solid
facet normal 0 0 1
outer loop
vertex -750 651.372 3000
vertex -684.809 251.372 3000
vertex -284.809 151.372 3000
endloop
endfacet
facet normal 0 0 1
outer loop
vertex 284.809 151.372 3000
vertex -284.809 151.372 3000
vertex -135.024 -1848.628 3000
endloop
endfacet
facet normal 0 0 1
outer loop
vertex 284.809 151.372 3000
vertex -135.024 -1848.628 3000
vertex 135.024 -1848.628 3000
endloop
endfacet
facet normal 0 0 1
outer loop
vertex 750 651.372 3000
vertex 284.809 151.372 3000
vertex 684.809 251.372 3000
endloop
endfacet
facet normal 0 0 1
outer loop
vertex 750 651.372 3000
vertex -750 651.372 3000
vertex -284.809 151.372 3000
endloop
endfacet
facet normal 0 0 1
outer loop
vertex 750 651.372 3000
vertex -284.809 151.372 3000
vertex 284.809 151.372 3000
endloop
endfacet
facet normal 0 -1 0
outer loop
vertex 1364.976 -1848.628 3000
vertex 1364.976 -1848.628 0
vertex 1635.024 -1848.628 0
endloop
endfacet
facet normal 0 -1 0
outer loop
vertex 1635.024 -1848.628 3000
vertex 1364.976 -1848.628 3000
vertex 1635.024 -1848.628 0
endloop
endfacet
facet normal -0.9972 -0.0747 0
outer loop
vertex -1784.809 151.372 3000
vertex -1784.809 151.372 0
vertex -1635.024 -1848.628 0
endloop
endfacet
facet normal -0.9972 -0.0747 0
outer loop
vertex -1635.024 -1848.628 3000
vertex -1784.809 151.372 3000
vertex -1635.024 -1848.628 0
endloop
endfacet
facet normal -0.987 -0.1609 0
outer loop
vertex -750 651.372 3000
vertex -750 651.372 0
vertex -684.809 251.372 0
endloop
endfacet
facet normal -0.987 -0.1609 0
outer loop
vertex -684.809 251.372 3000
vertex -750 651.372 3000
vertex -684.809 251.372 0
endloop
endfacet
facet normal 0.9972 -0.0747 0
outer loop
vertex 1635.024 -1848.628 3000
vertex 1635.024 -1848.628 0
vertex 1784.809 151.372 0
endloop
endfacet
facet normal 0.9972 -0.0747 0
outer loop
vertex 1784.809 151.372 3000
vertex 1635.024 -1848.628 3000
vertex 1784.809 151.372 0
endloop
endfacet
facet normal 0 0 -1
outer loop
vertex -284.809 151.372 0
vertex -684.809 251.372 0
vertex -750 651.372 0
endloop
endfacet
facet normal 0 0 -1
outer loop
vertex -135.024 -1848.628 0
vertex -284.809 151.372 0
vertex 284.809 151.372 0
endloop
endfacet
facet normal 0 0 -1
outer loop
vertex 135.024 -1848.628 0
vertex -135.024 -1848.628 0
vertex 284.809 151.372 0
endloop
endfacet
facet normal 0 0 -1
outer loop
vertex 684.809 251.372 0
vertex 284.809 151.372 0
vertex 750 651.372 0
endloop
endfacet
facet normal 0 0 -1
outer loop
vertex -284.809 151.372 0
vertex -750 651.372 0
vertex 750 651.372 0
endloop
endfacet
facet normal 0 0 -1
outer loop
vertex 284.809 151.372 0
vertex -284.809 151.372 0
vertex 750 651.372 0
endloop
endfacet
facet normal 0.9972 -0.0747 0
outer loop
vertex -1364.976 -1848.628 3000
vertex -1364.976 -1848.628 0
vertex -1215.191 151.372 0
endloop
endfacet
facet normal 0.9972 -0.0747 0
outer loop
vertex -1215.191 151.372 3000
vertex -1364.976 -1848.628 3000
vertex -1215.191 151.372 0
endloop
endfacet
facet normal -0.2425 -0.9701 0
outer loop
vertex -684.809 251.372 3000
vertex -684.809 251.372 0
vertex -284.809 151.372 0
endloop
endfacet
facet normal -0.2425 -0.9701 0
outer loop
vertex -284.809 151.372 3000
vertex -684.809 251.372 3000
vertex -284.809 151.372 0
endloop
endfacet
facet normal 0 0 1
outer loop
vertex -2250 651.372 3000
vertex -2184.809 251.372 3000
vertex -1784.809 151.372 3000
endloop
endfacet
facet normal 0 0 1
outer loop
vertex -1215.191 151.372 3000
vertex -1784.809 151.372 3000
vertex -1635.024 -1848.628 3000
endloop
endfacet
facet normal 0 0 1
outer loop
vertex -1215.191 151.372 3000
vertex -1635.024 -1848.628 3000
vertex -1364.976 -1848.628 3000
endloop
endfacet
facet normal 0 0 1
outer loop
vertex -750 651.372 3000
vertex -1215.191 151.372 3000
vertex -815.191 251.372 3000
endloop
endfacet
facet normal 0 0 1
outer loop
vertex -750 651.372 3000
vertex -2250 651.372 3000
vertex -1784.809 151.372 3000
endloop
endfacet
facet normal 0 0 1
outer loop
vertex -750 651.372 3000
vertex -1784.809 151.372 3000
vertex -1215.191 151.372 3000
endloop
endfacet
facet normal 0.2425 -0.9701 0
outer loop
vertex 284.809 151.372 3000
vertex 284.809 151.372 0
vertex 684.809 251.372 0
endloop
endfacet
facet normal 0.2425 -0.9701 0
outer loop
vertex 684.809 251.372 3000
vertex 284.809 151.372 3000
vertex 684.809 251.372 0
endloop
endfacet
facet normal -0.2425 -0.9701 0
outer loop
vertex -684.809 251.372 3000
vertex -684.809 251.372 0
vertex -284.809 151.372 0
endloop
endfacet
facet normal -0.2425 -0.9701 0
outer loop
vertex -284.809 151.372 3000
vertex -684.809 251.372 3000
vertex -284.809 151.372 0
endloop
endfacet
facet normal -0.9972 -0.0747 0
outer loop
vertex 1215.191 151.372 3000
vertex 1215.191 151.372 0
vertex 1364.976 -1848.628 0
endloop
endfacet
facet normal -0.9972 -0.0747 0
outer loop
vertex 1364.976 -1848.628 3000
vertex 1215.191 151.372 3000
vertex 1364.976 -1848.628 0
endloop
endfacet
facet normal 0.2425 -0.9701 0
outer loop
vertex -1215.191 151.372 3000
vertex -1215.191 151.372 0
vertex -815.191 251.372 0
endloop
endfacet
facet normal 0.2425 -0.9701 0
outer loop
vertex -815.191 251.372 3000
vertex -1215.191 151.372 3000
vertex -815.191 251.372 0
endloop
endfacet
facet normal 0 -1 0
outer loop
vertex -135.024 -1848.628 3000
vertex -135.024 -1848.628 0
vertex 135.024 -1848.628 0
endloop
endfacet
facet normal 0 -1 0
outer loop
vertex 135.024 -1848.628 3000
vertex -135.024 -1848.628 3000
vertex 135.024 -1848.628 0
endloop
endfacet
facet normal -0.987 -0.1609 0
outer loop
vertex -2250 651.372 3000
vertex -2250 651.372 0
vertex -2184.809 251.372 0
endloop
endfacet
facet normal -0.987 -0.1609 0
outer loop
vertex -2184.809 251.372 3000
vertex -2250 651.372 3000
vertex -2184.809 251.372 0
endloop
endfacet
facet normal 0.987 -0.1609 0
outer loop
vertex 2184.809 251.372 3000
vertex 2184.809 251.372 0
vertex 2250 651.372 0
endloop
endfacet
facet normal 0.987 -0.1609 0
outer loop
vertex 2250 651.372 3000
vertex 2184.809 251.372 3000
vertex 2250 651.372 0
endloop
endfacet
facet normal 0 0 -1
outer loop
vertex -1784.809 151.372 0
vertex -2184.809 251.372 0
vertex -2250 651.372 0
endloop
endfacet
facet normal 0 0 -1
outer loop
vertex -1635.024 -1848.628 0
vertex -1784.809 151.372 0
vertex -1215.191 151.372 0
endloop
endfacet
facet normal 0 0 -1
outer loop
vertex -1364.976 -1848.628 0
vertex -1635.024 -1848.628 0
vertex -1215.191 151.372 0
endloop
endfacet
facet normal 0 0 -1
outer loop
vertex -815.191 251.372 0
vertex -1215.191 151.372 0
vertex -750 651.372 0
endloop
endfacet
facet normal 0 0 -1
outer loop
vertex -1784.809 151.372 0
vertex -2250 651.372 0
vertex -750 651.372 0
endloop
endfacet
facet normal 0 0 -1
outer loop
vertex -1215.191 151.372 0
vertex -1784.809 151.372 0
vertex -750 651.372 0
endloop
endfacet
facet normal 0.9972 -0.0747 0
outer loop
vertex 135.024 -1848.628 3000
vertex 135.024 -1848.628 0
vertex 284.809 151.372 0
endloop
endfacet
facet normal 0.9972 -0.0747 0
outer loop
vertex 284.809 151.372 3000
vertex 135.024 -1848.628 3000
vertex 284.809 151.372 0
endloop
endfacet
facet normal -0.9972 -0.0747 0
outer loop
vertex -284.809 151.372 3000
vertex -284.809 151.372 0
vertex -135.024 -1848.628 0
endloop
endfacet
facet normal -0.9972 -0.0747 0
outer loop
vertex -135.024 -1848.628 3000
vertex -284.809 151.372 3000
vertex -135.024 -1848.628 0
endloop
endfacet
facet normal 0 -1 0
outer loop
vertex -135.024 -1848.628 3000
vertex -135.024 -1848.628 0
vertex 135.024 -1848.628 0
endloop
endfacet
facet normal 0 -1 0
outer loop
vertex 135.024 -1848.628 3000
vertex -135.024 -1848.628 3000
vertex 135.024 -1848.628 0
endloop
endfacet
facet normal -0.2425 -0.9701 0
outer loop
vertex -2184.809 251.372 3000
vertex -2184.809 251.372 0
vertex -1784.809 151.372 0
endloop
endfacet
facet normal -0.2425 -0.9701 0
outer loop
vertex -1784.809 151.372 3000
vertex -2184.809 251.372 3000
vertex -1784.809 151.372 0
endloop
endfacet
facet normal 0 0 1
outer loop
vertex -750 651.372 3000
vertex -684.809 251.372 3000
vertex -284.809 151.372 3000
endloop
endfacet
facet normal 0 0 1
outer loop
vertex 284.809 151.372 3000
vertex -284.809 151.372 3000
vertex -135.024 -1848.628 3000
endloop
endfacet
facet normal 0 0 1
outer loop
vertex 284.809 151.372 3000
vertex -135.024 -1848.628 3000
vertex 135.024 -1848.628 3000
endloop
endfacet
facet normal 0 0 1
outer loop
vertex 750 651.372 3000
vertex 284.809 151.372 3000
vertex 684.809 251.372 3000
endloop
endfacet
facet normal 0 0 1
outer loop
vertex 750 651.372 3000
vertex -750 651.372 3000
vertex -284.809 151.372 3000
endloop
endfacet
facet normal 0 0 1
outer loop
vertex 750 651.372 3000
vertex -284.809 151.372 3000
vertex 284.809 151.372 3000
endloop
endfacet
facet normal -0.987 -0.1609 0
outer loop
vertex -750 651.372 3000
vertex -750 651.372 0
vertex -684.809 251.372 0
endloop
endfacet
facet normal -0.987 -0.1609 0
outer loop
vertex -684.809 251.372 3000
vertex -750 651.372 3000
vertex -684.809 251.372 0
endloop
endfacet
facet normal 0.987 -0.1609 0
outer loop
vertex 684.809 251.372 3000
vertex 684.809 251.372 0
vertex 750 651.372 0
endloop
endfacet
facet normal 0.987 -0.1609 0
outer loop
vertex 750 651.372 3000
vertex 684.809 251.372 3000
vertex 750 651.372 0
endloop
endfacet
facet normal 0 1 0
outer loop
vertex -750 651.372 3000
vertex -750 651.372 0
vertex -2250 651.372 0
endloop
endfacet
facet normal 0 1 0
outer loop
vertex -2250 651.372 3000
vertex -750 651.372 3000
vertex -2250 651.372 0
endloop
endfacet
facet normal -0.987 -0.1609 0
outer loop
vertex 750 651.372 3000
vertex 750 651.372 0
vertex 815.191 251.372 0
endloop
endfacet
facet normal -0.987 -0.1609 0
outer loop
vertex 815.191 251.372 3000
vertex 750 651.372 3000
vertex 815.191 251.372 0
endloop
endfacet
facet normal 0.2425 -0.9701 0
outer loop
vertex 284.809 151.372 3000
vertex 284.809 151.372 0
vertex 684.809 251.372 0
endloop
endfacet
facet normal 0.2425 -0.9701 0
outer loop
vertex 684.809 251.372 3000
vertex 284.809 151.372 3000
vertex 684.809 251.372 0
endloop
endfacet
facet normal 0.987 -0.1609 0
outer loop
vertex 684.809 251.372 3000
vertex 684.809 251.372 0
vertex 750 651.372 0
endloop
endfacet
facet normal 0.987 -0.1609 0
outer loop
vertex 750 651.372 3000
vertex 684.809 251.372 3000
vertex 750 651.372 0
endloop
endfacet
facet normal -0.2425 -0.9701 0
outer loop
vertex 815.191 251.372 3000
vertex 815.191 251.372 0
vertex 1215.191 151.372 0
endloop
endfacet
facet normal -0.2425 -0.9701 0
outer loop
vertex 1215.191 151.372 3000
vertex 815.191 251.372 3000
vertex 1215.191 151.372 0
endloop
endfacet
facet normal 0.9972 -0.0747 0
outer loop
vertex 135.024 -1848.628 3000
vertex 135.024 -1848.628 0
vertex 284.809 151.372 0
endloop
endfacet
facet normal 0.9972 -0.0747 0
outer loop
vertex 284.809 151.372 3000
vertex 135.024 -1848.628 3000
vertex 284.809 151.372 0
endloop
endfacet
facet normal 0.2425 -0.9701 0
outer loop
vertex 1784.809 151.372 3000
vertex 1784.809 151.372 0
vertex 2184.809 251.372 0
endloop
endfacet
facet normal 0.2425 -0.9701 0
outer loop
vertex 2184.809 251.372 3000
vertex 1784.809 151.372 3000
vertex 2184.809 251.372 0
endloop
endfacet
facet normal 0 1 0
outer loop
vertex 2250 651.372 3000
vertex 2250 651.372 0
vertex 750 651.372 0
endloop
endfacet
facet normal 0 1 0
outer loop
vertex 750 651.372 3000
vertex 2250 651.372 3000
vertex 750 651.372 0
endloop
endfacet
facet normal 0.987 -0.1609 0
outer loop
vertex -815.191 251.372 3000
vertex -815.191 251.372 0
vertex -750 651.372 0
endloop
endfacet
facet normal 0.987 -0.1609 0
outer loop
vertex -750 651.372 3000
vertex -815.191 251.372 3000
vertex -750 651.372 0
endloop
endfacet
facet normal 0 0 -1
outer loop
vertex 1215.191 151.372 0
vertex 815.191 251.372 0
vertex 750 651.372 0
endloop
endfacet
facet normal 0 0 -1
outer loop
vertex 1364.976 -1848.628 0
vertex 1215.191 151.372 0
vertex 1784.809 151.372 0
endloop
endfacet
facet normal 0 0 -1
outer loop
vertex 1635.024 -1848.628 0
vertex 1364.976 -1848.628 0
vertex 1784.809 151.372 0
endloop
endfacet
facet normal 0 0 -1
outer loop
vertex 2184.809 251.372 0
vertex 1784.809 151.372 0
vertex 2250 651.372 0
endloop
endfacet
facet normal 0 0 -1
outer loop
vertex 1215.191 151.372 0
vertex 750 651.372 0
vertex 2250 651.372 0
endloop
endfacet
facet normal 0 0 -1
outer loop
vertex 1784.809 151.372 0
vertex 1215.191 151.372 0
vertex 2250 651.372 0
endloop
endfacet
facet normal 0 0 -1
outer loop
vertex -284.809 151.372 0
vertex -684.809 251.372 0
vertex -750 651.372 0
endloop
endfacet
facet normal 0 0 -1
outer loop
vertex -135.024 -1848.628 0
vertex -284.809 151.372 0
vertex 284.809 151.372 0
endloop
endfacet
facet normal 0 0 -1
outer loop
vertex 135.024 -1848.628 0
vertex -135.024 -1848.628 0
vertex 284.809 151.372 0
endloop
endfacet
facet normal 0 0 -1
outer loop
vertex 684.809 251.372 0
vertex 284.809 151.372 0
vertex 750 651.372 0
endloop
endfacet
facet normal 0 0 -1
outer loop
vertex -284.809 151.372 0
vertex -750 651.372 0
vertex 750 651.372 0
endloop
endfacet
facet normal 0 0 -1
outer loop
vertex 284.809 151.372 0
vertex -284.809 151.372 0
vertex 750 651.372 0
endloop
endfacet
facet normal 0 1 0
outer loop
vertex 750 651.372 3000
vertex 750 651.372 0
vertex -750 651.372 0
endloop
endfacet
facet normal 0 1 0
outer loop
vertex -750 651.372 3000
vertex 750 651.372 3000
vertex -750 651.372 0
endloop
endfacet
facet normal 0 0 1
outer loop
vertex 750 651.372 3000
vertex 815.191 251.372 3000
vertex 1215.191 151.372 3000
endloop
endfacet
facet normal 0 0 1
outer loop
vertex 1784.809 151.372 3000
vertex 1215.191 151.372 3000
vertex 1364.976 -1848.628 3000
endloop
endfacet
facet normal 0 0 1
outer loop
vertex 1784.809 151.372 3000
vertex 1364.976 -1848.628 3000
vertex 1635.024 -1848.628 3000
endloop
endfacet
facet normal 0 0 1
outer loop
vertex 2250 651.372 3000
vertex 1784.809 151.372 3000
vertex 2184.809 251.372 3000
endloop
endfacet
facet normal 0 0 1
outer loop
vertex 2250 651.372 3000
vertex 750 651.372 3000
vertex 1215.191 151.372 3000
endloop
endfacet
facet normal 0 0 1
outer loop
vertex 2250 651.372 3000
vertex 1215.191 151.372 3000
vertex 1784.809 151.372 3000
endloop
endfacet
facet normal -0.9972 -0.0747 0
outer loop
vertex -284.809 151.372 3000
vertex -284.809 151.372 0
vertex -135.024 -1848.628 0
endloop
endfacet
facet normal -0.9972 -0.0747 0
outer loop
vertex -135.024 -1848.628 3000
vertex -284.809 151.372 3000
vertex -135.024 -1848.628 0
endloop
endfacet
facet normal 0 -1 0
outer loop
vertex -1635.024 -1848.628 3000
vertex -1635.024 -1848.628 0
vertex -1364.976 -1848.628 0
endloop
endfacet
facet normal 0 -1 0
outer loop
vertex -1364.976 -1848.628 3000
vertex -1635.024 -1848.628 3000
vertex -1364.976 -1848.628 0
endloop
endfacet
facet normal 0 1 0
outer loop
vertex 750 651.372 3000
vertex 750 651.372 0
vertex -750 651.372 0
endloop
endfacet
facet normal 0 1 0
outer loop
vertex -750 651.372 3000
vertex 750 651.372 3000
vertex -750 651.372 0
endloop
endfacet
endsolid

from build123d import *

# Parameters (mm, degrees)
BOSS_EXTRUDE1_DEPTH = 3000
LPATTERN1_COUNT     = 2
LPATTERN1_PITCH     = 1500
LPATTERN1_2_COUNT   = 2
LPATTERN1_2_PITCH   = 1500


with BuildPart() as part:
    # Sketch1 → Boss-Extrude1 (new body)
    with BuildSketch(Plane.XY):
        Polygon((-284.808780443, 151.37221549), (-135.024268123, -1848.62778451), (0, -1848.62778451), (0, 651.37221549), (-750, 651.37221549), (-684.808780443, 251.37221549), align=None)
        Polygon((0, 651.37221549), (0, -1848.62778451), (135.024268123, -1848.62778451), (284.808780443, 151.37221549), (684.808780443, 251.37221549), (750, 651.37221549), align=None)
    extrude(amount=BOSS_EXTRUDE1_DEPTH)


with BuildPart() as lpattern1_1:
    # LPattern1: pattern copy
    add(part.part.moved(Location(Vector(1, 0, 0) * (1 * LPATTERN1_PITCH))))


with BuildPart() as lpattern1_2_1:
    # LPattern1 2: pattern copy
    add(part.part.moved(Location(Vector(-1, 0, 0) * (1 * LPATTERN1_2_PITCH))))


with BuildPart() as lpattern1_2_2:
    # LPattern1 2: pattern copy
    add(lpattern1_1.part.moved(Location(Vector(-1, 0, 0) * (1 * LPATTERN1_2_PITCH))))


solid = Compound([part.part, lpattern1_1.part, lpattern1_2_1.part, lpattern1_2_2.part])
